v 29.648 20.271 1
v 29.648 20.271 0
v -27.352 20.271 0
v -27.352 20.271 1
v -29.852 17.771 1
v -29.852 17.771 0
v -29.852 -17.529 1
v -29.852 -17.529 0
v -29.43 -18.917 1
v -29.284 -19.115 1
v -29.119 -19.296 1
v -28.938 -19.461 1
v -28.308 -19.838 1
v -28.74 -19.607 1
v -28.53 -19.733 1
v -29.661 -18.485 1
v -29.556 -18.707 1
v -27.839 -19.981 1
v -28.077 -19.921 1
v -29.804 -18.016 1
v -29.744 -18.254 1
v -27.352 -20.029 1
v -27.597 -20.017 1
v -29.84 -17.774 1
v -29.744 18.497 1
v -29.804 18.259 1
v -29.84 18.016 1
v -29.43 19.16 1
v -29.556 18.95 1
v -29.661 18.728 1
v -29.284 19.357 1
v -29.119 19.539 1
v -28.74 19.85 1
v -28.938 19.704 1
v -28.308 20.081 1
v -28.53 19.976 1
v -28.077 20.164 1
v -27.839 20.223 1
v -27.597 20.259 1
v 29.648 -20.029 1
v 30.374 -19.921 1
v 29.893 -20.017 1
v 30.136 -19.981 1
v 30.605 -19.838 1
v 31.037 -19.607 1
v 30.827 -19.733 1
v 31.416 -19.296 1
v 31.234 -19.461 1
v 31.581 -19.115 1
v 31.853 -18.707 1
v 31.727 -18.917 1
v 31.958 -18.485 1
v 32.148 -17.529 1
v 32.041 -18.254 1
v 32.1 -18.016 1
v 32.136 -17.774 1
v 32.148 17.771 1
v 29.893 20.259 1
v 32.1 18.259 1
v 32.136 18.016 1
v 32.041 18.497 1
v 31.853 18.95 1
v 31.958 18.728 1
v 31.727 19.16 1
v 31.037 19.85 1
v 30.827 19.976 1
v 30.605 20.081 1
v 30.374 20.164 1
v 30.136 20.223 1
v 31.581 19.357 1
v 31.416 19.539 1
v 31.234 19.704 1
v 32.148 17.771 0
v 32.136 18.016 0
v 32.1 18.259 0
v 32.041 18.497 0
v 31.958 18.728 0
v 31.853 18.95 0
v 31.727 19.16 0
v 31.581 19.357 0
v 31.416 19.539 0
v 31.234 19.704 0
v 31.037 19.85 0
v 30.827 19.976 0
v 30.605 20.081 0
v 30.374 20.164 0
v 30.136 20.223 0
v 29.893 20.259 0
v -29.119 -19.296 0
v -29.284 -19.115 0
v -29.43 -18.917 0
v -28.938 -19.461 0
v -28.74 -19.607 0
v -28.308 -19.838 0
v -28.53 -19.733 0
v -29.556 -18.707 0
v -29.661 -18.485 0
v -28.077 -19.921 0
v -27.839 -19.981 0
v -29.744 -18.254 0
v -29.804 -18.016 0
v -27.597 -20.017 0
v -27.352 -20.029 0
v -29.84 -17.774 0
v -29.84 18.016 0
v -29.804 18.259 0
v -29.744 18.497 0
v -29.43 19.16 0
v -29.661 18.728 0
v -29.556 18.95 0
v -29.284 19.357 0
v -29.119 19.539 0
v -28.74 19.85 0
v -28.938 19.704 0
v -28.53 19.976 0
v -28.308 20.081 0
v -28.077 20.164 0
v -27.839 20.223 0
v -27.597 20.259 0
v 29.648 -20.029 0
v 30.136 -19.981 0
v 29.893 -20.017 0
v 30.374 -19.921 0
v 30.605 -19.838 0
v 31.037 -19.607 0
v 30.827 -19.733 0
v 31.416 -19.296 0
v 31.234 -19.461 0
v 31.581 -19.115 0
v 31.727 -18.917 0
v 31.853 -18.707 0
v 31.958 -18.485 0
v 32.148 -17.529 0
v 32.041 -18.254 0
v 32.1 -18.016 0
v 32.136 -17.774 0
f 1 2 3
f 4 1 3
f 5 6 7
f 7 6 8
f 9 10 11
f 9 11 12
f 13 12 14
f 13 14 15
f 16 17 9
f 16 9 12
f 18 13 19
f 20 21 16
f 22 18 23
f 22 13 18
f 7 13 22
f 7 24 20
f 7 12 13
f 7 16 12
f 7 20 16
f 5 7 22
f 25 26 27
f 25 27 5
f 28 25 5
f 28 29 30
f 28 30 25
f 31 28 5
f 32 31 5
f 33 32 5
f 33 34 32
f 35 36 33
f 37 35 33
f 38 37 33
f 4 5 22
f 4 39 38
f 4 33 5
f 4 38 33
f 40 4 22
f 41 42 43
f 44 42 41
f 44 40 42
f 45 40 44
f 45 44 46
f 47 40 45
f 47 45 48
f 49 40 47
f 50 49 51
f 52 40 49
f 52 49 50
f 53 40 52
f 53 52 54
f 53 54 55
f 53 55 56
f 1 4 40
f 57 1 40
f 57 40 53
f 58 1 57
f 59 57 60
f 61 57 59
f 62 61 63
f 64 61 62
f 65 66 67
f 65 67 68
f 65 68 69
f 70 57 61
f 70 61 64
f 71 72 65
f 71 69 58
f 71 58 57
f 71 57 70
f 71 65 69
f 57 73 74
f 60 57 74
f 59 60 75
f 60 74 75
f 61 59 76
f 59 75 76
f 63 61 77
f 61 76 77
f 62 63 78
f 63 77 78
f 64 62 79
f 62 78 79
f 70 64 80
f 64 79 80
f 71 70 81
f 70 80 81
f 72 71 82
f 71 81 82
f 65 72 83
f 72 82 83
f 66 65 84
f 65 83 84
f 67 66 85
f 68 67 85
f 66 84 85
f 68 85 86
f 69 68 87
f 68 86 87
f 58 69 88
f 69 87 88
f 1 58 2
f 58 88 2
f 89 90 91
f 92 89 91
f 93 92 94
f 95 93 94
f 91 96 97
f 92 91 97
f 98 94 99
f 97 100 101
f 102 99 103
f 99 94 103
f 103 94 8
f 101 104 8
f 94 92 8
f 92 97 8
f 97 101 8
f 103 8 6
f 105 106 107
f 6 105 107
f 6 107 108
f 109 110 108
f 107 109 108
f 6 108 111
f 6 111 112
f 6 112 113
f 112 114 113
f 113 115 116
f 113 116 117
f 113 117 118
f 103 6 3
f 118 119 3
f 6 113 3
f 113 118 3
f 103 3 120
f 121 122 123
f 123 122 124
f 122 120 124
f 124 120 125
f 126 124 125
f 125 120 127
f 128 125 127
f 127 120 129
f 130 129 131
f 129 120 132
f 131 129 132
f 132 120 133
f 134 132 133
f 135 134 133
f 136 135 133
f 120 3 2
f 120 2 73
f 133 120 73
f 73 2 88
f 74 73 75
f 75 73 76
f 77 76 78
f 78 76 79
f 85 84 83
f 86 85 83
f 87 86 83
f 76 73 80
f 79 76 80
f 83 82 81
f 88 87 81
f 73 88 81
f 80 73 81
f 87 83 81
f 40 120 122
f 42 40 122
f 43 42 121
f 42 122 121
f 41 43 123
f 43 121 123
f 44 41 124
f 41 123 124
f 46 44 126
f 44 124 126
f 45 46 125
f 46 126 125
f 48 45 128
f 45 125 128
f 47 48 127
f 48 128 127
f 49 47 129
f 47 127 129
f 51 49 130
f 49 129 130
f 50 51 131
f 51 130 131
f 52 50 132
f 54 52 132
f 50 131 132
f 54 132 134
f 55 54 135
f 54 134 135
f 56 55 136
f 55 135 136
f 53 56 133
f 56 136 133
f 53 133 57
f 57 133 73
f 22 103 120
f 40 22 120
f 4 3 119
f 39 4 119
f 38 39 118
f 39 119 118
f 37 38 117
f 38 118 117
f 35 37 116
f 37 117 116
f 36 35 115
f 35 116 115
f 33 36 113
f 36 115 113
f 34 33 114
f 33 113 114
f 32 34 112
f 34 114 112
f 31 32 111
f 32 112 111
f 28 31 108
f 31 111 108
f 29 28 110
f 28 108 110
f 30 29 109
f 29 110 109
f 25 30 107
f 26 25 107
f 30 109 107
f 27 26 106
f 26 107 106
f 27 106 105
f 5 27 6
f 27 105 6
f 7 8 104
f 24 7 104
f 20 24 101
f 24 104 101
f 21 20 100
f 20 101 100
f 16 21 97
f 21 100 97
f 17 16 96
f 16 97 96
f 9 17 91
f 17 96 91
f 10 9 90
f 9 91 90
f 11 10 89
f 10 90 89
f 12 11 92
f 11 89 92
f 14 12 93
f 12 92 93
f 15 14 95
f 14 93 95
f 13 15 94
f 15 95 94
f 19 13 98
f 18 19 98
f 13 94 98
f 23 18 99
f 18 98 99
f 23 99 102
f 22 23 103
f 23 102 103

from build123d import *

# Parameters (mm, degrees)
RESSALTO_EXTRUS_O1_DEPTH = 1


with BuildPart() as part:
    # Esboço1 → Ressalto-extrusão1 (new body)
    with BuildSketch(Plane.XY):
        with BuildLine():
            Line((32.148439705, -17.528571429), (32.148439705, 17.771428571))
            ThreePointArc((32.148439705, 17.771428571), (31.416206658, 19.539195524), (29.648439705, 20.271428571))
            Line((29.648439705, 20.271428571), (-27.351560295, 20.271428571))
            ThreePointArc((-27.351560295, 20.271428571), (-29.119327248, 19.539195524), (-29.851560295, 17.771428571))
            Line((-29.851560295, 17.771428571), (-29.851560295, -17.528571429))
            ThreePointArc((-29.851560295, -17.528571429), (-29.119327248, -19.296338382), (-27.351560295, -20.028571429))
            Line((-27.351560295, -20.028571429), (29.648439705, -20.028571429))
            ThreePointArc((29.648439705, -20.028571429), (31.416206658, -19.296338382), (32.148439705, -17.528571429))
        make_face()
    extrude(amount=RESSALTO_EXTRUS_O1_DEPTH)


solid = part.part
